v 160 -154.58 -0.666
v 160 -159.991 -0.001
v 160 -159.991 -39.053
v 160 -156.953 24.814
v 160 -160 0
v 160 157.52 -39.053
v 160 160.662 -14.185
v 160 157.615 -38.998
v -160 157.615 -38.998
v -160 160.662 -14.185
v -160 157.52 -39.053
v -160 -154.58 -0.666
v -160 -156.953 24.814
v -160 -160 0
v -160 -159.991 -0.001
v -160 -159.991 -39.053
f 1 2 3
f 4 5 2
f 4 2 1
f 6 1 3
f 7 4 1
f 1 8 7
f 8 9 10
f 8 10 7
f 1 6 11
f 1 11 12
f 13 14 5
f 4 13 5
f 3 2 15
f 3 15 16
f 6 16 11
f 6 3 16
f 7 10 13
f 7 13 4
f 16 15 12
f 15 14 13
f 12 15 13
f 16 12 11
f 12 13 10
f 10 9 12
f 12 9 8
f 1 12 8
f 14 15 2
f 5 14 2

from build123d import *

# Parameters (mm, degrees)
F0_W     = 320
F0_H     = 320
F1_DEPTH = 25
F2_ANGLE = 7
F4_DEPTH = 160


with BuildPart() as f1:
    # F0 (on Top) → F1 (new body)
    with BuildSketch(Plane.XY):
        Rectangle(F0_W, F0_H)
    extrude(amount=F1_DEPTH)


with BuildPart() as f1_1:
    # F2: moved
    add(f1.part.rotate(Axis((0, -160, 0), (-1, 0, 0)), F2_ANGLE))

    # F3 (on Right) → F4 (join, symmetric)
    with BuildSketch(Plane.YZ):
        Polygon((157.52013, -39.052658), (-159.990668, 0), (-159.990668, -39.052658), align=None)
    extrude(amount=F4_DEPTH, both=True)


solid = f1_1.part
